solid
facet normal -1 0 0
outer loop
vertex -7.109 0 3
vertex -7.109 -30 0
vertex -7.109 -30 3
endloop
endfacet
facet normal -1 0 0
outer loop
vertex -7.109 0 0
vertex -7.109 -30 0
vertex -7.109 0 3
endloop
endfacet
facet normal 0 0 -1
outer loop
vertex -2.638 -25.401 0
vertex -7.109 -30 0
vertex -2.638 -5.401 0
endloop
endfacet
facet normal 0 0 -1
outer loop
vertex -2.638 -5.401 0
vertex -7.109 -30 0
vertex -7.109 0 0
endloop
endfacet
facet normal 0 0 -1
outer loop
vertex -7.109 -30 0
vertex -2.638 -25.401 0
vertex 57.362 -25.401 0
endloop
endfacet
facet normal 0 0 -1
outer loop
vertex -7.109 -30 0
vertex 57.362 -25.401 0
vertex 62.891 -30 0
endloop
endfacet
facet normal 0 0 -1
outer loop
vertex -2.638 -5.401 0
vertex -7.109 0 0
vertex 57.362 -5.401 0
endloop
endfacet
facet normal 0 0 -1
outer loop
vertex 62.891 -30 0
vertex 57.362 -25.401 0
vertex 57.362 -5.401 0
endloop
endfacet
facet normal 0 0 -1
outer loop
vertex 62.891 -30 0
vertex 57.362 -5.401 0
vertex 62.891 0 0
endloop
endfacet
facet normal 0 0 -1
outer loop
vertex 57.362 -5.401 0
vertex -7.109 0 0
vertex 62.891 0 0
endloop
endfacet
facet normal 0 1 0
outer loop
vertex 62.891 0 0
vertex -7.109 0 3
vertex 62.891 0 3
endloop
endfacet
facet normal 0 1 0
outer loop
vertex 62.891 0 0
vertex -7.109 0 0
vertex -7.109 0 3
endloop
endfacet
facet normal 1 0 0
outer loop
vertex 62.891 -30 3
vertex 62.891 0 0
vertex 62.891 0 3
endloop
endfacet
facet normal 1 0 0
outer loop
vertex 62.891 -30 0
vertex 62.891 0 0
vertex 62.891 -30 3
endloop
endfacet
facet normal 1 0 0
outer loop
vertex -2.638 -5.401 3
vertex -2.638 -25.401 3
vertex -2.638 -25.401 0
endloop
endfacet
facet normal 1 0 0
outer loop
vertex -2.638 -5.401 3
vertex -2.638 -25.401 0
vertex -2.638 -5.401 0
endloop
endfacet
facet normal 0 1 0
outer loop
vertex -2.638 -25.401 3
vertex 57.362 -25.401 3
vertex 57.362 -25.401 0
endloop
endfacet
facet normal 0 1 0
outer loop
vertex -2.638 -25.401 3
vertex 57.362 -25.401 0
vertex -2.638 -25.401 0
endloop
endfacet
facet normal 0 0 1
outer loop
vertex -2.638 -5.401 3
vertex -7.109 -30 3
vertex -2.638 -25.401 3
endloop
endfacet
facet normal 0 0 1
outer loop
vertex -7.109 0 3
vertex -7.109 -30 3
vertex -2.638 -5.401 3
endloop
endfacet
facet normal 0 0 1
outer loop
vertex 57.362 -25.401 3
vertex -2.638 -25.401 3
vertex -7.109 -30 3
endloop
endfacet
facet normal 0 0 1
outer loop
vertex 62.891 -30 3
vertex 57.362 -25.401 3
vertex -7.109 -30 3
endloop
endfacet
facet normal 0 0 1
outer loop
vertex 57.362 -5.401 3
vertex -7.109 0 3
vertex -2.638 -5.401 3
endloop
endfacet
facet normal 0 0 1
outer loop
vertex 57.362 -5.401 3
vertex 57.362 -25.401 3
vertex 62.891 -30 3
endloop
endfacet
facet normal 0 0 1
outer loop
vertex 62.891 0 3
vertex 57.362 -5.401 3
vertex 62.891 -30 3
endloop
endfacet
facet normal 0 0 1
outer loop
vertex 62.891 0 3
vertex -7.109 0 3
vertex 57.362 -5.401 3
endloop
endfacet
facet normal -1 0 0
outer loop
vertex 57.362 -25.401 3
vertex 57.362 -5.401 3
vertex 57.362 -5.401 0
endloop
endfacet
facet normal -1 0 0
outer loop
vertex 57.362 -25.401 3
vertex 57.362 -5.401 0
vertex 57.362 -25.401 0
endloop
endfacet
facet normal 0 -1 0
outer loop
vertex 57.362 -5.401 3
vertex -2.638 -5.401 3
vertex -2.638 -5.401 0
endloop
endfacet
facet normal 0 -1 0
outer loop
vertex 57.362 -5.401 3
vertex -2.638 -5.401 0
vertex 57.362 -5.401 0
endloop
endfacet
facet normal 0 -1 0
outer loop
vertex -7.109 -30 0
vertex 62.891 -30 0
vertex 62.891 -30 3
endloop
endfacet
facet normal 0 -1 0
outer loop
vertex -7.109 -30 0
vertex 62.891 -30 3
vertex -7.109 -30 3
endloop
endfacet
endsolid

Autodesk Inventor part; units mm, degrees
ref_plane "YZ Plane" through (0, 0, 0) normal (1, 0, 0) x (0, 1, 0)
ref_plane "XZ Plane" through (0, 0, 0) normal (0, 1, 0) x (-1, 0, 0)
ref_plane "XY Plane" through (0, 0, 0) normal (0, 0, 1) x (1, 0, 0)
sketch "Sketch1" plane through (0, 0, 0) normal (0, 0, 1) x (1, 0, 0)
  line L0 (-7.1091, 0) -> (62.8909, 0)
  line L1 (62.8909, 0) -> (62.8909, -30)
  line L2 (62.8909, -30) -> (-7.1091, -30)
  line L3 (-7.1091, -30) -> (-7.1091, 0)
  point P0 (0, 0)
  dimension "d0" = 70
  dimension "d1" = 30
extrude "Extrusion1" add sketch "Sketch1" along normal blind 3
sketch "Sketch2" plane through (0, 0, 3) normal (0, 0, 1) x (1, 0, 0)
  line L0 (57.3616, -25.4008) -> (-2.6384, -25.4008)
  line L1 (-2.6384, -25.4008) -> (-2.6384, -5.4008)
  line L2 (-2.6384, -5.4008) -> (57.3616, -5.4008)
  line L3 (57.3616, -5.4008) -> (57.3616, -25.4008)
  line L4 (57.3616, -25.4008) -> (-2.6384, -5.4008) construction
  line L5 (-2.6384, -25.4008) -> (57.3616, -5.4008) construction
  point P0 (0, 0)
  point P1 (27.3616, -15.4008)
  dimension "d4" = 60
  dimension "d5" = 20
extrude "Extrusion2" cut sketch "Sketch2" against normal blind 3
properties part number "mouth_open"
